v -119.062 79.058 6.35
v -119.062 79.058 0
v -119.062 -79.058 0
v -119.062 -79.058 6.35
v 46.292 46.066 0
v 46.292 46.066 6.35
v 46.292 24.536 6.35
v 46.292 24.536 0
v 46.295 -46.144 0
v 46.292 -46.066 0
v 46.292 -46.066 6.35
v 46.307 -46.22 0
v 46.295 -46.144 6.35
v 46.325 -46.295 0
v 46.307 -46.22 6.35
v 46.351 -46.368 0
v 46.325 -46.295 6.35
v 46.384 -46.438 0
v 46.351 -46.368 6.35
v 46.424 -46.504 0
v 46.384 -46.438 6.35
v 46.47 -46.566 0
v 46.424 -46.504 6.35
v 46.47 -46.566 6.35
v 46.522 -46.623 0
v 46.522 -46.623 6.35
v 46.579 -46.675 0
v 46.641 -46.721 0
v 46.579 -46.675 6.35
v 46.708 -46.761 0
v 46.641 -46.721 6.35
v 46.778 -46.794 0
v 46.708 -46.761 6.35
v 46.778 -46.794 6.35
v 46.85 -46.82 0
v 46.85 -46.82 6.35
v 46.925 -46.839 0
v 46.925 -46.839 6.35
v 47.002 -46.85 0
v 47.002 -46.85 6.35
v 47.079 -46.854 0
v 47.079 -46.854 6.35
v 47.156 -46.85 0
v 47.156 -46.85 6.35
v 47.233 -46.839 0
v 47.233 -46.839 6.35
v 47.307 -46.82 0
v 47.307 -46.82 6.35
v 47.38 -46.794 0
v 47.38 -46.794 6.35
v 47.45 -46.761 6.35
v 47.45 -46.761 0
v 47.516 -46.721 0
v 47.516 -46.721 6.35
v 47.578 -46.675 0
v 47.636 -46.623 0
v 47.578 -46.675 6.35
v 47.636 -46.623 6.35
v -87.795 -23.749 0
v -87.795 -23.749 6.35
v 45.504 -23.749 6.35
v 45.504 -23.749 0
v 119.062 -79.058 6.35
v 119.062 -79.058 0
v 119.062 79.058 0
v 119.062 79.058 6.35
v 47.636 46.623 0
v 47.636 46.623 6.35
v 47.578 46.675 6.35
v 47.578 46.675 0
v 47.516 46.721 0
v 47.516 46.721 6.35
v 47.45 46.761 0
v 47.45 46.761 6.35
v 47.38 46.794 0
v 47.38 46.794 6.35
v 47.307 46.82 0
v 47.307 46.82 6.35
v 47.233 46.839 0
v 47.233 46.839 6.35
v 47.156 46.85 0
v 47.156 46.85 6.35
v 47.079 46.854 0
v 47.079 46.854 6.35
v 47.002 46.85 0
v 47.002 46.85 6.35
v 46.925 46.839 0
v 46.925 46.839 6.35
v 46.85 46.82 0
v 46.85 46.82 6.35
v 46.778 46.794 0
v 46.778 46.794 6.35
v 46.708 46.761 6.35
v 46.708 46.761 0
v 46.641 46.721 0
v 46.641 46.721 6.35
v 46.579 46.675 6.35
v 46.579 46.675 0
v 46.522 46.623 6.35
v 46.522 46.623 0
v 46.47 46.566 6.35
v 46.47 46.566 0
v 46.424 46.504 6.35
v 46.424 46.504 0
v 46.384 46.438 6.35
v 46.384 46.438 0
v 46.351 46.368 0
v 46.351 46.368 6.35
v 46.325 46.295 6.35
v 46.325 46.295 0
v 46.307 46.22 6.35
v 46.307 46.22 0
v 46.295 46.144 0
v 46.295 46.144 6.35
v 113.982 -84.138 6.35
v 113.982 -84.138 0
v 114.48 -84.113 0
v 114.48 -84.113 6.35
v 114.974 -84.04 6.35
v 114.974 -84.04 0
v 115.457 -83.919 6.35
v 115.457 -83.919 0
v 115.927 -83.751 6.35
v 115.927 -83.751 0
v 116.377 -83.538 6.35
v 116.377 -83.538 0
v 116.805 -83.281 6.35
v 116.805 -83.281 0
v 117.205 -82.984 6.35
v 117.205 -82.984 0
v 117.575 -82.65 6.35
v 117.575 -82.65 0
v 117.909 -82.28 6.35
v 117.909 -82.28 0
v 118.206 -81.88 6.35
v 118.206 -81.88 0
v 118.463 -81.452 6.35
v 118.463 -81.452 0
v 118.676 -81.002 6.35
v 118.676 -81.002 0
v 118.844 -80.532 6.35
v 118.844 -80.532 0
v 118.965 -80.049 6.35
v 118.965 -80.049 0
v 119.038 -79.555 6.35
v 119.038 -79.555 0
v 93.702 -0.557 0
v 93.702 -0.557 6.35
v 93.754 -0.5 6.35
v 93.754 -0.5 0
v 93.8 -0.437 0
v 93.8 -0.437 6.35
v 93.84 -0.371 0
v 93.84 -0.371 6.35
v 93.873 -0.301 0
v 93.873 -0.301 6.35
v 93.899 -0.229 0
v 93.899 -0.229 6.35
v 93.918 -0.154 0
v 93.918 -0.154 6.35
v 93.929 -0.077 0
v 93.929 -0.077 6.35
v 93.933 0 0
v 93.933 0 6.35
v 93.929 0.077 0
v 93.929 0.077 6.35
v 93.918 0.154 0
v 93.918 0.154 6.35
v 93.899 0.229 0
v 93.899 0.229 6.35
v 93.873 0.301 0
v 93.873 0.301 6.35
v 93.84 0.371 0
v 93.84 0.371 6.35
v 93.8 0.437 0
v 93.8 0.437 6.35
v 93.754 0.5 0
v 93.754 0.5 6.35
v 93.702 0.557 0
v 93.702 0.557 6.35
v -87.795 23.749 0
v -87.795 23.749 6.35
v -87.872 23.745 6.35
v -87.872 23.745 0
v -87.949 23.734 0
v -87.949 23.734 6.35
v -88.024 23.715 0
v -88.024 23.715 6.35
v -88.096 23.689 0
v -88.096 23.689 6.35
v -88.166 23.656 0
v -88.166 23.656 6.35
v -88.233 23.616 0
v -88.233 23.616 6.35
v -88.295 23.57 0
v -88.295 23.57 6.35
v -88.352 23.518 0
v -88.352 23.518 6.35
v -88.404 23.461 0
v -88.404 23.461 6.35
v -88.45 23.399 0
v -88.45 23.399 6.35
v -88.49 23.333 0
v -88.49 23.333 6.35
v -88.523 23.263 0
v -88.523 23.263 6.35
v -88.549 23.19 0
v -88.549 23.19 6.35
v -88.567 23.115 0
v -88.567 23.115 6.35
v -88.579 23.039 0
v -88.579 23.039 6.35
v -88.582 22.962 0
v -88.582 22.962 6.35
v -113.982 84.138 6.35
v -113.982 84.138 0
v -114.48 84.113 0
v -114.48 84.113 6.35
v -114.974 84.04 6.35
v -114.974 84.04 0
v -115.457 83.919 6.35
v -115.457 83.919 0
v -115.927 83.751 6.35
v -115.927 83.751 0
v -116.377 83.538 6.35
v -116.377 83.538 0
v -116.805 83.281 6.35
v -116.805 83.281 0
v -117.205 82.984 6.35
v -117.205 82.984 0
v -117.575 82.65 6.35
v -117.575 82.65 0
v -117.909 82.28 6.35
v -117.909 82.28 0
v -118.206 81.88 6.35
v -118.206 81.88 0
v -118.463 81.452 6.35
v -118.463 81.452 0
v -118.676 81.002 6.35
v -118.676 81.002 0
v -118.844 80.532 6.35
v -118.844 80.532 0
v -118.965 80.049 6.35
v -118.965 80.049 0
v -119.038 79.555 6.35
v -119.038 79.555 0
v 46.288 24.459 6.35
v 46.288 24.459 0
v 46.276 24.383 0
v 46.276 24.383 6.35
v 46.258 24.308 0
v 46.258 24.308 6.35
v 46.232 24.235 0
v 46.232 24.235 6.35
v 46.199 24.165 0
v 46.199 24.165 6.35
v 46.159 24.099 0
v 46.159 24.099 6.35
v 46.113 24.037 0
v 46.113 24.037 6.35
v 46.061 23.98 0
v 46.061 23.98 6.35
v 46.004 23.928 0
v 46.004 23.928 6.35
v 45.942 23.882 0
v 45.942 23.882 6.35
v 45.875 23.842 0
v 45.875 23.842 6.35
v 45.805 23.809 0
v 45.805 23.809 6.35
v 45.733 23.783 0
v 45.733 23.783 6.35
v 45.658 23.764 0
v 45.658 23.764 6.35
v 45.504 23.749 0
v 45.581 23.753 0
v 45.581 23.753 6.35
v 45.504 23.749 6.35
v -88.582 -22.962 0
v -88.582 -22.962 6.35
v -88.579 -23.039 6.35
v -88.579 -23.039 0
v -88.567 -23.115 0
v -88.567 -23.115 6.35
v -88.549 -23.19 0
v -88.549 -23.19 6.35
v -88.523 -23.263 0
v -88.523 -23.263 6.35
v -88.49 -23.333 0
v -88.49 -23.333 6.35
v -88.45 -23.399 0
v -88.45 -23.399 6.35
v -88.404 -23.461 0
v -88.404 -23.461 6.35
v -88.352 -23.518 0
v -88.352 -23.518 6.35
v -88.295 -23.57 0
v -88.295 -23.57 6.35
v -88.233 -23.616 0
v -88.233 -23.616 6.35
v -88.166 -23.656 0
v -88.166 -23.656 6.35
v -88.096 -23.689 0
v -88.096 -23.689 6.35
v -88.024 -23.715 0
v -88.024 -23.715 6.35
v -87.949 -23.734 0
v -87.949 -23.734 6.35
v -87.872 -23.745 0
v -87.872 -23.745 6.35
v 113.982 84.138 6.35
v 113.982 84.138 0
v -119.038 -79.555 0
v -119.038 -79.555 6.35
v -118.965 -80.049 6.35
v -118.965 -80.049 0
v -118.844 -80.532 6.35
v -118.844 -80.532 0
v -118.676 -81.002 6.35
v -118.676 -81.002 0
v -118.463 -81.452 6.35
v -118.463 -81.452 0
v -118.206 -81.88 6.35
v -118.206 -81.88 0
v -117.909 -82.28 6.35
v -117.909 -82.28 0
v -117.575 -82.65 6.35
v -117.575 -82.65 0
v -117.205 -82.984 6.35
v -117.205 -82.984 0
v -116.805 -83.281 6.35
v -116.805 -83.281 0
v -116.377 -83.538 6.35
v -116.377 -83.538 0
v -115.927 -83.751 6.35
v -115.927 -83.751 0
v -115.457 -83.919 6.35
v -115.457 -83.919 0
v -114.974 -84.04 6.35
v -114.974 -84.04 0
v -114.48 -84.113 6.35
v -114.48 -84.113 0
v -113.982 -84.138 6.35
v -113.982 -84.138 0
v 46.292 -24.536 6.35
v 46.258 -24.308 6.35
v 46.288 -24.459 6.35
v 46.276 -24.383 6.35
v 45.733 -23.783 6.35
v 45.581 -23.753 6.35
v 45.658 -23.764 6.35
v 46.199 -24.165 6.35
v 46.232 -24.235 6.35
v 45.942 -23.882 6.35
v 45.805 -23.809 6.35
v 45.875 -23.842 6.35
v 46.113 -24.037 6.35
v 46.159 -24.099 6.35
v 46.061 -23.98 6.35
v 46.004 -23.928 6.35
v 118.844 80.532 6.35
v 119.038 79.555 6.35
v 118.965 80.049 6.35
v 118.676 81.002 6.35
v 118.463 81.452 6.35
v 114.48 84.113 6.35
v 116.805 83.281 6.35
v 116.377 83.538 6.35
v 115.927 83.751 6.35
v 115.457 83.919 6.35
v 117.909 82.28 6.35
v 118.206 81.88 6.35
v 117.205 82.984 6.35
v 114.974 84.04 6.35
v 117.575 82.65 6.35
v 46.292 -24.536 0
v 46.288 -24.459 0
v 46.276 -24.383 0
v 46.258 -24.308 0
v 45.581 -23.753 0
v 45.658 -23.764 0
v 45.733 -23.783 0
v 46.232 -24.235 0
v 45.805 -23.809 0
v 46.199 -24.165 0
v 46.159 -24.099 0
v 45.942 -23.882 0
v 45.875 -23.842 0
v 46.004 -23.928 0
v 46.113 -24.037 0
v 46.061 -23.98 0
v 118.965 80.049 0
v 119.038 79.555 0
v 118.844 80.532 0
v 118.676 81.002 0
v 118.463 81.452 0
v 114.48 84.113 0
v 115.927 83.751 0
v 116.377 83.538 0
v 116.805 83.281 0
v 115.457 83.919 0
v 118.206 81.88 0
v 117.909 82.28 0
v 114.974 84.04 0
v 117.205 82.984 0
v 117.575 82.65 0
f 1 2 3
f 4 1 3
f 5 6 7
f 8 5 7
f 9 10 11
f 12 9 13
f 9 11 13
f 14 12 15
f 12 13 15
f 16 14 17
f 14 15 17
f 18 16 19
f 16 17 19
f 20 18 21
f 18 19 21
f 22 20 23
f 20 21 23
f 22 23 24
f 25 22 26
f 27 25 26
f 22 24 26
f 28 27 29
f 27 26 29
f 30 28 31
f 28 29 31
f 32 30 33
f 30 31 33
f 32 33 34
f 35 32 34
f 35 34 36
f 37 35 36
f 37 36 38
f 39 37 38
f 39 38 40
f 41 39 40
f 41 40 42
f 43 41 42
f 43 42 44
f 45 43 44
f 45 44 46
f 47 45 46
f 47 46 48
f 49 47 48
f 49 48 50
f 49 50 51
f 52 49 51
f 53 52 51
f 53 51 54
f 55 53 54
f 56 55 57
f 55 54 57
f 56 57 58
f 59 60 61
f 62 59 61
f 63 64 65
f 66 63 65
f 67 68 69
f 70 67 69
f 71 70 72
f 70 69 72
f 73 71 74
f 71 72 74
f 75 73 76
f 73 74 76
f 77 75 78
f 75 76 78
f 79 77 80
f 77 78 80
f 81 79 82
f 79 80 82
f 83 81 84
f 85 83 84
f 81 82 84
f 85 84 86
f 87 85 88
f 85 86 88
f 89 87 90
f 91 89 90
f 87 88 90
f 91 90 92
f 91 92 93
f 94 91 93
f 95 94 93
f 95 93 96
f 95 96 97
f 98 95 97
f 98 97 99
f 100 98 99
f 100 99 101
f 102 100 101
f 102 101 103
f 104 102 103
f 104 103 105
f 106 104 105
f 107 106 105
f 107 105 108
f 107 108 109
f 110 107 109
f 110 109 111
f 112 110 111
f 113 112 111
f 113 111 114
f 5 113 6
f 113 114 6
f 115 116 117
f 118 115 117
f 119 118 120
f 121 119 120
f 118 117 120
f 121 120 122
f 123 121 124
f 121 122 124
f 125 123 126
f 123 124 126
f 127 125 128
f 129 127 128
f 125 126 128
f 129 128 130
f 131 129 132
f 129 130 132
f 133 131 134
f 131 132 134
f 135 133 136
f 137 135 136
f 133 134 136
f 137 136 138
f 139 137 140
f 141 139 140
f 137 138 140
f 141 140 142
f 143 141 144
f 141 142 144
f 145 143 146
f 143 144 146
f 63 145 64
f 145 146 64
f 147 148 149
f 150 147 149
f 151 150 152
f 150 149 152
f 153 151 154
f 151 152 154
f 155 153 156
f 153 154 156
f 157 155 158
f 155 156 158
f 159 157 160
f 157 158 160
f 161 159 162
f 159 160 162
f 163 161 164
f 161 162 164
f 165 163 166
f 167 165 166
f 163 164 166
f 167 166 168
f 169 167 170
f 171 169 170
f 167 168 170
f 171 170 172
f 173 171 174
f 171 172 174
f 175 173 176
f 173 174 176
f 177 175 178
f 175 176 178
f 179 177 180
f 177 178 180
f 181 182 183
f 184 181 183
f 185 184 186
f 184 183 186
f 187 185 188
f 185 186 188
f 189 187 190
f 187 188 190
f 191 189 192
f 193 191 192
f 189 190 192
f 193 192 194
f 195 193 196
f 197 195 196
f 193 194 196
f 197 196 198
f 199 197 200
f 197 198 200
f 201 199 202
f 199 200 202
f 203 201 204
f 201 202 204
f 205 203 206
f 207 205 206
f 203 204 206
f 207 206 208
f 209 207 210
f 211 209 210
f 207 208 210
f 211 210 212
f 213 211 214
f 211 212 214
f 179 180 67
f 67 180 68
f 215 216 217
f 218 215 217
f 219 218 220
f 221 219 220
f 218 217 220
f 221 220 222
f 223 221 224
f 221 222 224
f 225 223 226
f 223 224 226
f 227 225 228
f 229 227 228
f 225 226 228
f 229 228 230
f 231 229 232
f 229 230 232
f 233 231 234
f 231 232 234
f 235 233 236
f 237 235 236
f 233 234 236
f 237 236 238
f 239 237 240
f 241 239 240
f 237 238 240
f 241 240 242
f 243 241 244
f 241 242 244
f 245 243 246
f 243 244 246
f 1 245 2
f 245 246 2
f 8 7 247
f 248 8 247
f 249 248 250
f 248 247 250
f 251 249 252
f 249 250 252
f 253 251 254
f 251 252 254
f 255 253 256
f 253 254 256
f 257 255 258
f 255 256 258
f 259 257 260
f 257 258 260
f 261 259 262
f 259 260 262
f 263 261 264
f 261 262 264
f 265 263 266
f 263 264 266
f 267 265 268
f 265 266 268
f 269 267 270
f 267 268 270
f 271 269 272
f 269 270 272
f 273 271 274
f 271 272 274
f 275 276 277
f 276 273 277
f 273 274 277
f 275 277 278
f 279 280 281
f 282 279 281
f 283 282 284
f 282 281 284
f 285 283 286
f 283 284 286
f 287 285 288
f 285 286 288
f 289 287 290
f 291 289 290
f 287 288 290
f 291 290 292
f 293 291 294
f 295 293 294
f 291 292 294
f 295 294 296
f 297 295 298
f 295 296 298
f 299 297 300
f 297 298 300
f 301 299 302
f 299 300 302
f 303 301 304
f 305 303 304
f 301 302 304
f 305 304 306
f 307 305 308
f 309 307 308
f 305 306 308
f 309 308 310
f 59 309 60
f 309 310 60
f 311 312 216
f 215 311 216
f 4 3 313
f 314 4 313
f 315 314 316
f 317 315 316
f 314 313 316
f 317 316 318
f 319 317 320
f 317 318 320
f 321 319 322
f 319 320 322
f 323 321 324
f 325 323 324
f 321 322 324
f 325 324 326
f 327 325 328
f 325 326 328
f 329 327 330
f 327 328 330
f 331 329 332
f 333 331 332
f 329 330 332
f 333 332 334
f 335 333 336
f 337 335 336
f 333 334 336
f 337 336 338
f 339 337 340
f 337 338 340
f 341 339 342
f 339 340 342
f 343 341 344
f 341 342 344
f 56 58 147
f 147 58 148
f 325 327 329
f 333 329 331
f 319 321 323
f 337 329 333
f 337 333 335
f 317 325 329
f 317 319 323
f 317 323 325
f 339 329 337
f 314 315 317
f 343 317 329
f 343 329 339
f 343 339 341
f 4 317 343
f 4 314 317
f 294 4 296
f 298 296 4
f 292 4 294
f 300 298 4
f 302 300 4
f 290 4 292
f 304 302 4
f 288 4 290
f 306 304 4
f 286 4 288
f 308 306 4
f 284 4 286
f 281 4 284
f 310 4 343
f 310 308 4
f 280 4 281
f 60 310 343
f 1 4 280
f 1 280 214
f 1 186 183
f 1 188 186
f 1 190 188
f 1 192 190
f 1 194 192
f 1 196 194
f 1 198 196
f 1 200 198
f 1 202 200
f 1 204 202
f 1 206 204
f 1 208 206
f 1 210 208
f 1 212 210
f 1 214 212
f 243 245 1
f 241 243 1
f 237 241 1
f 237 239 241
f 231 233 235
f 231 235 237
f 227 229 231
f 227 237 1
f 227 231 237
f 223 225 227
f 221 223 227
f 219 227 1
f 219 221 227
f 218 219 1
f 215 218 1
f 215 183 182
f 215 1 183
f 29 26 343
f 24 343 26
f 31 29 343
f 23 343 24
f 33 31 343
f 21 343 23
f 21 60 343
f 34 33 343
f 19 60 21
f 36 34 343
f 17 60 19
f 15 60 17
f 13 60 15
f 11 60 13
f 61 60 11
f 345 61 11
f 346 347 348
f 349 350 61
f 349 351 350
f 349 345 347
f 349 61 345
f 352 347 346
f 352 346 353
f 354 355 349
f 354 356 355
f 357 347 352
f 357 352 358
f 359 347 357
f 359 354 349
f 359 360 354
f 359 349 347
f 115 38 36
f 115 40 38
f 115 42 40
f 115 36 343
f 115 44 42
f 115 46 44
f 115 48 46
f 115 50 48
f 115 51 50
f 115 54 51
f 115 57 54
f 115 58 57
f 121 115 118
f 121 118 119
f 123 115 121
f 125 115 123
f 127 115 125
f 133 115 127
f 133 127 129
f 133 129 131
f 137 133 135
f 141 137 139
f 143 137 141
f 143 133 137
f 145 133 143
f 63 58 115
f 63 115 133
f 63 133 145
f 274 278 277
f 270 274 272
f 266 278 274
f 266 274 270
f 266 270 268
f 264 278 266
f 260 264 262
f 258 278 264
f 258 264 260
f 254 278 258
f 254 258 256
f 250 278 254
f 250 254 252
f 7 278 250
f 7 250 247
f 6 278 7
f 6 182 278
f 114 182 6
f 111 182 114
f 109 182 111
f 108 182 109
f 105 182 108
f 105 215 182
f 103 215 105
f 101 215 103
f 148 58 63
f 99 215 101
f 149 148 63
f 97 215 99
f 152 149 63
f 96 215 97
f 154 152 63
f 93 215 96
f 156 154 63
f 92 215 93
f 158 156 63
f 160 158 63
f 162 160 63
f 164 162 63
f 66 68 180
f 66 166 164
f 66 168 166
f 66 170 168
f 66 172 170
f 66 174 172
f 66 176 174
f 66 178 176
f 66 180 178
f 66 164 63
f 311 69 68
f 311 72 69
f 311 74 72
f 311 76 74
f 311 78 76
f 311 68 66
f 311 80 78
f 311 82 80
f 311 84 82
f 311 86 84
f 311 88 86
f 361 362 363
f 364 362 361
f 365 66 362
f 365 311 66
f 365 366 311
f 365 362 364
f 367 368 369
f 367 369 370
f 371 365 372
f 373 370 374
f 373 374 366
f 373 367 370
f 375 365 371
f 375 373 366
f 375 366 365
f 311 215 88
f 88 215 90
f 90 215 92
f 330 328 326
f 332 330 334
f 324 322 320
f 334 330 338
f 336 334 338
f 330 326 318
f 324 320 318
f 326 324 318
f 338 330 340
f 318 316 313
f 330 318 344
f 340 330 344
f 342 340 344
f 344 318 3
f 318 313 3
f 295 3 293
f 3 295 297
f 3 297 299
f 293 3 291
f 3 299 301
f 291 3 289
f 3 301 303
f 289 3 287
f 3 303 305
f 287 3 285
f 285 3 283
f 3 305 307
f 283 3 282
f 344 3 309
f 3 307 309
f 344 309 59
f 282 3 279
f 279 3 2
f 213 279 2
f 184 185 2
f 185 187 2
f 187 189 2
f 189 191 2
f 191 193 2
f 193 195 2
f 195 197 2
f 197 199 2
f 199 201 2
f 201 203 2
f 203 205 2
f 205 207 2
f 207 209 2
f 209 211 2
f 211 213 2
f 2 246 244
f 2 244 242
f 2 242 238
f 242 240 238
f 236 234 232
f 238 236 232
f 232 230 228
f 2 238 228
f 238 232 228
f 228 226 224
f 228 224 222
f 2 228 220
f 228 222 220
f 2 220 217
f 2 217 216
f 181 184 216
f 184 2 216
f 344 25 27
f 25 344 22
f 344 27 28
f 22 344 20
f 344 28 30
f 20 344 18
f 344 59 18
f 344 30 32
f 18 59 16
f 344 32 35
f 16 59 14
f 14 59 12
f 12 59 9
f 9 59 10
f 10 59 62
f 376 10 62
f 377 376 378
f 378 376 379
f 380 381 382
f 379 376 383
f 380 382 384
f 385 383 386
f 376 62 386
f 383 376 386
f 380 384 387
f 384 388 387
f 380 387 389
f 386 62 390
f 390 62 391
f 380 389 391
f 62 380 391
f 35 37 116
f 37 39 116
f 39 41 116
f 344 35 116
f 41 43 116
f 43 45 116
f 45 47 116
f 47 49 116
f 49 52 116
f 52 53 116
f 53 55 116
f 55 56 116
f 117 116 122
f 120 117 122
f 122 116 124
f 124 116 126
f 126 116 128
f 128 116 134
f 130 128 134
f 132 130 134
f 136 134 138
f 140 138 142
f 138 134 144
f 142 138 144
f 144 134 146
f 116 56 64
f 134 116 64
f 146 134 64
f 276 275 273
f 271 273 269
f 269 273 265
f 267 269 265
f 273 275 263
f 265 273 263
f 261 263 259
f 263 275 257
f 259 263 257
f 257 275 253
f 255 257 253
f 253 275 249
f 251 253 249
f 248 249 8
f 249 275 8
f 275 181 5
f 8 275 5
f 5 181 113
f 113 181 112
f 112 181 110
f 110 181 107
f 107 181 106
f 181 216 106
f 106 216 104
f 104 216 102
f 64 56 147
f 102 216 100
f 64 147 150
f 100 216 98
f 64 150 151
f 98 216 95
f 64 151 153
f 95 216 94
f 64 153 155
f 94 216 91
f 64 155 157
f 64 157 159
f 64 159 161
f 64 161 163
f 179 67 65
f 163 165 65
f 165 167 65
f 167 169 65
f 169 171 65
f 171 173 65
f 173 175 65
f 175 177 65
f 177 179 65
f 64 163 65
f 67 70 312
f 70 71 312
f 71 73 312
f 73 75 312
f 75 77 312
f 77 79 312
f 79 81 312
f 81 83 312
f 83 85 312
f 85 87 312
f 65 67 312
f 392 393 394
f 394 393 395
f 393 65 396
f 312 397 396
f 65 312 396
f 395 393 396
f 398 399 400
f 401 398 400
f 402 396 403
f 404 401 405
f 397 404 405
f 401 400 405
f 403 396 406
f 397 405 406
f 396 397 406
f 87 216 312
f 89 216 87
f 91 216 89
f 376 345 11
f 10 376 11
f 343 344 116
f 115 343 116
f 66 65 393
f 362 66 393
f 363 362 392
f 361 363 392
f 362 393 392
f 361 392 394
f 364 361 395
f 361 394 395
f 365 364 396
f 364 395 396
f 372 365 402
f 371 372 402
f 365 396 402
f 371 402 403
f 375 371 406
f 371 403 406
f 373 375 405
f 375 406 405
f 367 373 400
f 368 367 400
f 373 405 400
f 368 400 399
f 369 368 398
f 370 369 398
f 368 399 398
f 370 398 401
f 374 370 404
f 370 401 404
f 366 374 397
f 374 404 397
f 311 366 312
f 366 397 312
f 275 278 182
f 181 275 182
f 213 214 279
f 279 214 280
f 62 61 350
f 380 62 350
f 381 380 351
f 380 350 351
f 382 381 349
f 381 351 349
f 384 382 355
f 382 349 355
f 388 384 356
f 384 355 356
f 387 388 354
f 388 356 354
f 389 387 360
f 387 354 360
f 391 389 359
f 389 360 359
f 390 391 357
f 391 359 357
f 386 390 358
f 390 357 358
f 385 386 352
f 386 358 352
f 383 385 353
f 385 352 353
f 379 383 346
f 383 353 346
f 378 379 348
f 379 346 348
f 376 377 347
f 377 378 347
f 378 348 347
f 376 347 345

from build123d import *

# Parameters (mm, degrees)
F1_DEPTH = 6.35
F3_DEPTH = 6.351
F5_DEPTH = 6.351


with BuildPart() as f1:
    # F0 (on Top) → F1 (new body)
    with BuildSketch(Plane.XY):
        with BuildLine():
            Line((113.9825, 84.1375), (-113.9825, 84.1375))
            ThreePointArc((-113.9825, 84.1375), (-117.574602, 82.649602), (-119.0625, 79.0575))
            Line((-119.0625, 79.0575), (-119.0625, -79.0575))
            ThreePointArc((-119.0625, -79.0575), (-117.574602, -82.649602), (-113.9825, -84.1375))
            Line((-113.9825, -84.1375), (113.9825, -84.1375))
            ThreePointArc((113.9825, -84.1375), (117.574602, -82.649602), (119.0625, -79.0575))
            Line((119.0625, -79.0575), (119.0625, 79.0575))
            ThreePointArc((119.0625, 79.0575), (117.574602, 82.649602), (113.9825, 84.1375))
        make_face()
    extrude(amount=F1_DEPTH)

    # F2 (on face) → F3 (cut, through all)
    with BuildSketch(Plane.XY.offset(6.35)):
        Polygon((-87.3125, 22.479), (-87.3125, 0), (-87.3125, -22.479), (47.5615, -22.479), (47.5615, -44.901281), (92.462781, 0), (47.5615, 44.901281), (47.5615, 22.479), align=None)
    extrude(amount=-F3_DEPTH, mode=Mode.SUBTRACT)

    # F4 (on face) → F5 (cut, through all)
    with BuildSketch(Plane.XY.offset(6.35)):
        with BuildLine():
            Line((-88.5825, 22.9616), (-88.5825, -22.9616))
            ThreePointArc((-88.5825, -22.9616), (-88.351876, -23.518376), (-87.7951, -23.749))
            Line((-87.7951, -23.749), (45.5041, -23.749))
            ThreePointArc((45.5041, -23.749), (46.060876, -23.979624), (46.2915, -24.5364))
            Line((46.2915, -24.5364), (46.2915, -46.06638))
            ThreePointArc((46.2915, -46.06638), (46.777575, -46.793843), (47.635676, -46.623156))
            Line((47.635676, -46.623156), (93.702056, -0.556776))
            ThreePointArc((93.702056, -0.556776), (93.93268, 0), (93.702056, 0.556776))
            Line((93.702056, 0.556776), (47.635676, 46.623156))
            ThreePointArc((47.635676, 46.623156), (46.777575, 46.793843), (46.2915, 46.06638))
            Line((46.2915, 46.06638), (46.2915, 24.5364))
            ThreePointArc((46.2915, 24.5364), (46.060876, 23.979624), (45.5041, 23.749))
            Line((45.5041, 23.749), (-87.7951, 23.749))
            ThreePointArc((-87.7951, 23.749), (-88.351876, 23.518376), (-88.5825, 22.9616))
        make_face()
    extrude(amount=-F5_DEPTH, mode=Mode.SUBTRACT)


solid = f1.part
